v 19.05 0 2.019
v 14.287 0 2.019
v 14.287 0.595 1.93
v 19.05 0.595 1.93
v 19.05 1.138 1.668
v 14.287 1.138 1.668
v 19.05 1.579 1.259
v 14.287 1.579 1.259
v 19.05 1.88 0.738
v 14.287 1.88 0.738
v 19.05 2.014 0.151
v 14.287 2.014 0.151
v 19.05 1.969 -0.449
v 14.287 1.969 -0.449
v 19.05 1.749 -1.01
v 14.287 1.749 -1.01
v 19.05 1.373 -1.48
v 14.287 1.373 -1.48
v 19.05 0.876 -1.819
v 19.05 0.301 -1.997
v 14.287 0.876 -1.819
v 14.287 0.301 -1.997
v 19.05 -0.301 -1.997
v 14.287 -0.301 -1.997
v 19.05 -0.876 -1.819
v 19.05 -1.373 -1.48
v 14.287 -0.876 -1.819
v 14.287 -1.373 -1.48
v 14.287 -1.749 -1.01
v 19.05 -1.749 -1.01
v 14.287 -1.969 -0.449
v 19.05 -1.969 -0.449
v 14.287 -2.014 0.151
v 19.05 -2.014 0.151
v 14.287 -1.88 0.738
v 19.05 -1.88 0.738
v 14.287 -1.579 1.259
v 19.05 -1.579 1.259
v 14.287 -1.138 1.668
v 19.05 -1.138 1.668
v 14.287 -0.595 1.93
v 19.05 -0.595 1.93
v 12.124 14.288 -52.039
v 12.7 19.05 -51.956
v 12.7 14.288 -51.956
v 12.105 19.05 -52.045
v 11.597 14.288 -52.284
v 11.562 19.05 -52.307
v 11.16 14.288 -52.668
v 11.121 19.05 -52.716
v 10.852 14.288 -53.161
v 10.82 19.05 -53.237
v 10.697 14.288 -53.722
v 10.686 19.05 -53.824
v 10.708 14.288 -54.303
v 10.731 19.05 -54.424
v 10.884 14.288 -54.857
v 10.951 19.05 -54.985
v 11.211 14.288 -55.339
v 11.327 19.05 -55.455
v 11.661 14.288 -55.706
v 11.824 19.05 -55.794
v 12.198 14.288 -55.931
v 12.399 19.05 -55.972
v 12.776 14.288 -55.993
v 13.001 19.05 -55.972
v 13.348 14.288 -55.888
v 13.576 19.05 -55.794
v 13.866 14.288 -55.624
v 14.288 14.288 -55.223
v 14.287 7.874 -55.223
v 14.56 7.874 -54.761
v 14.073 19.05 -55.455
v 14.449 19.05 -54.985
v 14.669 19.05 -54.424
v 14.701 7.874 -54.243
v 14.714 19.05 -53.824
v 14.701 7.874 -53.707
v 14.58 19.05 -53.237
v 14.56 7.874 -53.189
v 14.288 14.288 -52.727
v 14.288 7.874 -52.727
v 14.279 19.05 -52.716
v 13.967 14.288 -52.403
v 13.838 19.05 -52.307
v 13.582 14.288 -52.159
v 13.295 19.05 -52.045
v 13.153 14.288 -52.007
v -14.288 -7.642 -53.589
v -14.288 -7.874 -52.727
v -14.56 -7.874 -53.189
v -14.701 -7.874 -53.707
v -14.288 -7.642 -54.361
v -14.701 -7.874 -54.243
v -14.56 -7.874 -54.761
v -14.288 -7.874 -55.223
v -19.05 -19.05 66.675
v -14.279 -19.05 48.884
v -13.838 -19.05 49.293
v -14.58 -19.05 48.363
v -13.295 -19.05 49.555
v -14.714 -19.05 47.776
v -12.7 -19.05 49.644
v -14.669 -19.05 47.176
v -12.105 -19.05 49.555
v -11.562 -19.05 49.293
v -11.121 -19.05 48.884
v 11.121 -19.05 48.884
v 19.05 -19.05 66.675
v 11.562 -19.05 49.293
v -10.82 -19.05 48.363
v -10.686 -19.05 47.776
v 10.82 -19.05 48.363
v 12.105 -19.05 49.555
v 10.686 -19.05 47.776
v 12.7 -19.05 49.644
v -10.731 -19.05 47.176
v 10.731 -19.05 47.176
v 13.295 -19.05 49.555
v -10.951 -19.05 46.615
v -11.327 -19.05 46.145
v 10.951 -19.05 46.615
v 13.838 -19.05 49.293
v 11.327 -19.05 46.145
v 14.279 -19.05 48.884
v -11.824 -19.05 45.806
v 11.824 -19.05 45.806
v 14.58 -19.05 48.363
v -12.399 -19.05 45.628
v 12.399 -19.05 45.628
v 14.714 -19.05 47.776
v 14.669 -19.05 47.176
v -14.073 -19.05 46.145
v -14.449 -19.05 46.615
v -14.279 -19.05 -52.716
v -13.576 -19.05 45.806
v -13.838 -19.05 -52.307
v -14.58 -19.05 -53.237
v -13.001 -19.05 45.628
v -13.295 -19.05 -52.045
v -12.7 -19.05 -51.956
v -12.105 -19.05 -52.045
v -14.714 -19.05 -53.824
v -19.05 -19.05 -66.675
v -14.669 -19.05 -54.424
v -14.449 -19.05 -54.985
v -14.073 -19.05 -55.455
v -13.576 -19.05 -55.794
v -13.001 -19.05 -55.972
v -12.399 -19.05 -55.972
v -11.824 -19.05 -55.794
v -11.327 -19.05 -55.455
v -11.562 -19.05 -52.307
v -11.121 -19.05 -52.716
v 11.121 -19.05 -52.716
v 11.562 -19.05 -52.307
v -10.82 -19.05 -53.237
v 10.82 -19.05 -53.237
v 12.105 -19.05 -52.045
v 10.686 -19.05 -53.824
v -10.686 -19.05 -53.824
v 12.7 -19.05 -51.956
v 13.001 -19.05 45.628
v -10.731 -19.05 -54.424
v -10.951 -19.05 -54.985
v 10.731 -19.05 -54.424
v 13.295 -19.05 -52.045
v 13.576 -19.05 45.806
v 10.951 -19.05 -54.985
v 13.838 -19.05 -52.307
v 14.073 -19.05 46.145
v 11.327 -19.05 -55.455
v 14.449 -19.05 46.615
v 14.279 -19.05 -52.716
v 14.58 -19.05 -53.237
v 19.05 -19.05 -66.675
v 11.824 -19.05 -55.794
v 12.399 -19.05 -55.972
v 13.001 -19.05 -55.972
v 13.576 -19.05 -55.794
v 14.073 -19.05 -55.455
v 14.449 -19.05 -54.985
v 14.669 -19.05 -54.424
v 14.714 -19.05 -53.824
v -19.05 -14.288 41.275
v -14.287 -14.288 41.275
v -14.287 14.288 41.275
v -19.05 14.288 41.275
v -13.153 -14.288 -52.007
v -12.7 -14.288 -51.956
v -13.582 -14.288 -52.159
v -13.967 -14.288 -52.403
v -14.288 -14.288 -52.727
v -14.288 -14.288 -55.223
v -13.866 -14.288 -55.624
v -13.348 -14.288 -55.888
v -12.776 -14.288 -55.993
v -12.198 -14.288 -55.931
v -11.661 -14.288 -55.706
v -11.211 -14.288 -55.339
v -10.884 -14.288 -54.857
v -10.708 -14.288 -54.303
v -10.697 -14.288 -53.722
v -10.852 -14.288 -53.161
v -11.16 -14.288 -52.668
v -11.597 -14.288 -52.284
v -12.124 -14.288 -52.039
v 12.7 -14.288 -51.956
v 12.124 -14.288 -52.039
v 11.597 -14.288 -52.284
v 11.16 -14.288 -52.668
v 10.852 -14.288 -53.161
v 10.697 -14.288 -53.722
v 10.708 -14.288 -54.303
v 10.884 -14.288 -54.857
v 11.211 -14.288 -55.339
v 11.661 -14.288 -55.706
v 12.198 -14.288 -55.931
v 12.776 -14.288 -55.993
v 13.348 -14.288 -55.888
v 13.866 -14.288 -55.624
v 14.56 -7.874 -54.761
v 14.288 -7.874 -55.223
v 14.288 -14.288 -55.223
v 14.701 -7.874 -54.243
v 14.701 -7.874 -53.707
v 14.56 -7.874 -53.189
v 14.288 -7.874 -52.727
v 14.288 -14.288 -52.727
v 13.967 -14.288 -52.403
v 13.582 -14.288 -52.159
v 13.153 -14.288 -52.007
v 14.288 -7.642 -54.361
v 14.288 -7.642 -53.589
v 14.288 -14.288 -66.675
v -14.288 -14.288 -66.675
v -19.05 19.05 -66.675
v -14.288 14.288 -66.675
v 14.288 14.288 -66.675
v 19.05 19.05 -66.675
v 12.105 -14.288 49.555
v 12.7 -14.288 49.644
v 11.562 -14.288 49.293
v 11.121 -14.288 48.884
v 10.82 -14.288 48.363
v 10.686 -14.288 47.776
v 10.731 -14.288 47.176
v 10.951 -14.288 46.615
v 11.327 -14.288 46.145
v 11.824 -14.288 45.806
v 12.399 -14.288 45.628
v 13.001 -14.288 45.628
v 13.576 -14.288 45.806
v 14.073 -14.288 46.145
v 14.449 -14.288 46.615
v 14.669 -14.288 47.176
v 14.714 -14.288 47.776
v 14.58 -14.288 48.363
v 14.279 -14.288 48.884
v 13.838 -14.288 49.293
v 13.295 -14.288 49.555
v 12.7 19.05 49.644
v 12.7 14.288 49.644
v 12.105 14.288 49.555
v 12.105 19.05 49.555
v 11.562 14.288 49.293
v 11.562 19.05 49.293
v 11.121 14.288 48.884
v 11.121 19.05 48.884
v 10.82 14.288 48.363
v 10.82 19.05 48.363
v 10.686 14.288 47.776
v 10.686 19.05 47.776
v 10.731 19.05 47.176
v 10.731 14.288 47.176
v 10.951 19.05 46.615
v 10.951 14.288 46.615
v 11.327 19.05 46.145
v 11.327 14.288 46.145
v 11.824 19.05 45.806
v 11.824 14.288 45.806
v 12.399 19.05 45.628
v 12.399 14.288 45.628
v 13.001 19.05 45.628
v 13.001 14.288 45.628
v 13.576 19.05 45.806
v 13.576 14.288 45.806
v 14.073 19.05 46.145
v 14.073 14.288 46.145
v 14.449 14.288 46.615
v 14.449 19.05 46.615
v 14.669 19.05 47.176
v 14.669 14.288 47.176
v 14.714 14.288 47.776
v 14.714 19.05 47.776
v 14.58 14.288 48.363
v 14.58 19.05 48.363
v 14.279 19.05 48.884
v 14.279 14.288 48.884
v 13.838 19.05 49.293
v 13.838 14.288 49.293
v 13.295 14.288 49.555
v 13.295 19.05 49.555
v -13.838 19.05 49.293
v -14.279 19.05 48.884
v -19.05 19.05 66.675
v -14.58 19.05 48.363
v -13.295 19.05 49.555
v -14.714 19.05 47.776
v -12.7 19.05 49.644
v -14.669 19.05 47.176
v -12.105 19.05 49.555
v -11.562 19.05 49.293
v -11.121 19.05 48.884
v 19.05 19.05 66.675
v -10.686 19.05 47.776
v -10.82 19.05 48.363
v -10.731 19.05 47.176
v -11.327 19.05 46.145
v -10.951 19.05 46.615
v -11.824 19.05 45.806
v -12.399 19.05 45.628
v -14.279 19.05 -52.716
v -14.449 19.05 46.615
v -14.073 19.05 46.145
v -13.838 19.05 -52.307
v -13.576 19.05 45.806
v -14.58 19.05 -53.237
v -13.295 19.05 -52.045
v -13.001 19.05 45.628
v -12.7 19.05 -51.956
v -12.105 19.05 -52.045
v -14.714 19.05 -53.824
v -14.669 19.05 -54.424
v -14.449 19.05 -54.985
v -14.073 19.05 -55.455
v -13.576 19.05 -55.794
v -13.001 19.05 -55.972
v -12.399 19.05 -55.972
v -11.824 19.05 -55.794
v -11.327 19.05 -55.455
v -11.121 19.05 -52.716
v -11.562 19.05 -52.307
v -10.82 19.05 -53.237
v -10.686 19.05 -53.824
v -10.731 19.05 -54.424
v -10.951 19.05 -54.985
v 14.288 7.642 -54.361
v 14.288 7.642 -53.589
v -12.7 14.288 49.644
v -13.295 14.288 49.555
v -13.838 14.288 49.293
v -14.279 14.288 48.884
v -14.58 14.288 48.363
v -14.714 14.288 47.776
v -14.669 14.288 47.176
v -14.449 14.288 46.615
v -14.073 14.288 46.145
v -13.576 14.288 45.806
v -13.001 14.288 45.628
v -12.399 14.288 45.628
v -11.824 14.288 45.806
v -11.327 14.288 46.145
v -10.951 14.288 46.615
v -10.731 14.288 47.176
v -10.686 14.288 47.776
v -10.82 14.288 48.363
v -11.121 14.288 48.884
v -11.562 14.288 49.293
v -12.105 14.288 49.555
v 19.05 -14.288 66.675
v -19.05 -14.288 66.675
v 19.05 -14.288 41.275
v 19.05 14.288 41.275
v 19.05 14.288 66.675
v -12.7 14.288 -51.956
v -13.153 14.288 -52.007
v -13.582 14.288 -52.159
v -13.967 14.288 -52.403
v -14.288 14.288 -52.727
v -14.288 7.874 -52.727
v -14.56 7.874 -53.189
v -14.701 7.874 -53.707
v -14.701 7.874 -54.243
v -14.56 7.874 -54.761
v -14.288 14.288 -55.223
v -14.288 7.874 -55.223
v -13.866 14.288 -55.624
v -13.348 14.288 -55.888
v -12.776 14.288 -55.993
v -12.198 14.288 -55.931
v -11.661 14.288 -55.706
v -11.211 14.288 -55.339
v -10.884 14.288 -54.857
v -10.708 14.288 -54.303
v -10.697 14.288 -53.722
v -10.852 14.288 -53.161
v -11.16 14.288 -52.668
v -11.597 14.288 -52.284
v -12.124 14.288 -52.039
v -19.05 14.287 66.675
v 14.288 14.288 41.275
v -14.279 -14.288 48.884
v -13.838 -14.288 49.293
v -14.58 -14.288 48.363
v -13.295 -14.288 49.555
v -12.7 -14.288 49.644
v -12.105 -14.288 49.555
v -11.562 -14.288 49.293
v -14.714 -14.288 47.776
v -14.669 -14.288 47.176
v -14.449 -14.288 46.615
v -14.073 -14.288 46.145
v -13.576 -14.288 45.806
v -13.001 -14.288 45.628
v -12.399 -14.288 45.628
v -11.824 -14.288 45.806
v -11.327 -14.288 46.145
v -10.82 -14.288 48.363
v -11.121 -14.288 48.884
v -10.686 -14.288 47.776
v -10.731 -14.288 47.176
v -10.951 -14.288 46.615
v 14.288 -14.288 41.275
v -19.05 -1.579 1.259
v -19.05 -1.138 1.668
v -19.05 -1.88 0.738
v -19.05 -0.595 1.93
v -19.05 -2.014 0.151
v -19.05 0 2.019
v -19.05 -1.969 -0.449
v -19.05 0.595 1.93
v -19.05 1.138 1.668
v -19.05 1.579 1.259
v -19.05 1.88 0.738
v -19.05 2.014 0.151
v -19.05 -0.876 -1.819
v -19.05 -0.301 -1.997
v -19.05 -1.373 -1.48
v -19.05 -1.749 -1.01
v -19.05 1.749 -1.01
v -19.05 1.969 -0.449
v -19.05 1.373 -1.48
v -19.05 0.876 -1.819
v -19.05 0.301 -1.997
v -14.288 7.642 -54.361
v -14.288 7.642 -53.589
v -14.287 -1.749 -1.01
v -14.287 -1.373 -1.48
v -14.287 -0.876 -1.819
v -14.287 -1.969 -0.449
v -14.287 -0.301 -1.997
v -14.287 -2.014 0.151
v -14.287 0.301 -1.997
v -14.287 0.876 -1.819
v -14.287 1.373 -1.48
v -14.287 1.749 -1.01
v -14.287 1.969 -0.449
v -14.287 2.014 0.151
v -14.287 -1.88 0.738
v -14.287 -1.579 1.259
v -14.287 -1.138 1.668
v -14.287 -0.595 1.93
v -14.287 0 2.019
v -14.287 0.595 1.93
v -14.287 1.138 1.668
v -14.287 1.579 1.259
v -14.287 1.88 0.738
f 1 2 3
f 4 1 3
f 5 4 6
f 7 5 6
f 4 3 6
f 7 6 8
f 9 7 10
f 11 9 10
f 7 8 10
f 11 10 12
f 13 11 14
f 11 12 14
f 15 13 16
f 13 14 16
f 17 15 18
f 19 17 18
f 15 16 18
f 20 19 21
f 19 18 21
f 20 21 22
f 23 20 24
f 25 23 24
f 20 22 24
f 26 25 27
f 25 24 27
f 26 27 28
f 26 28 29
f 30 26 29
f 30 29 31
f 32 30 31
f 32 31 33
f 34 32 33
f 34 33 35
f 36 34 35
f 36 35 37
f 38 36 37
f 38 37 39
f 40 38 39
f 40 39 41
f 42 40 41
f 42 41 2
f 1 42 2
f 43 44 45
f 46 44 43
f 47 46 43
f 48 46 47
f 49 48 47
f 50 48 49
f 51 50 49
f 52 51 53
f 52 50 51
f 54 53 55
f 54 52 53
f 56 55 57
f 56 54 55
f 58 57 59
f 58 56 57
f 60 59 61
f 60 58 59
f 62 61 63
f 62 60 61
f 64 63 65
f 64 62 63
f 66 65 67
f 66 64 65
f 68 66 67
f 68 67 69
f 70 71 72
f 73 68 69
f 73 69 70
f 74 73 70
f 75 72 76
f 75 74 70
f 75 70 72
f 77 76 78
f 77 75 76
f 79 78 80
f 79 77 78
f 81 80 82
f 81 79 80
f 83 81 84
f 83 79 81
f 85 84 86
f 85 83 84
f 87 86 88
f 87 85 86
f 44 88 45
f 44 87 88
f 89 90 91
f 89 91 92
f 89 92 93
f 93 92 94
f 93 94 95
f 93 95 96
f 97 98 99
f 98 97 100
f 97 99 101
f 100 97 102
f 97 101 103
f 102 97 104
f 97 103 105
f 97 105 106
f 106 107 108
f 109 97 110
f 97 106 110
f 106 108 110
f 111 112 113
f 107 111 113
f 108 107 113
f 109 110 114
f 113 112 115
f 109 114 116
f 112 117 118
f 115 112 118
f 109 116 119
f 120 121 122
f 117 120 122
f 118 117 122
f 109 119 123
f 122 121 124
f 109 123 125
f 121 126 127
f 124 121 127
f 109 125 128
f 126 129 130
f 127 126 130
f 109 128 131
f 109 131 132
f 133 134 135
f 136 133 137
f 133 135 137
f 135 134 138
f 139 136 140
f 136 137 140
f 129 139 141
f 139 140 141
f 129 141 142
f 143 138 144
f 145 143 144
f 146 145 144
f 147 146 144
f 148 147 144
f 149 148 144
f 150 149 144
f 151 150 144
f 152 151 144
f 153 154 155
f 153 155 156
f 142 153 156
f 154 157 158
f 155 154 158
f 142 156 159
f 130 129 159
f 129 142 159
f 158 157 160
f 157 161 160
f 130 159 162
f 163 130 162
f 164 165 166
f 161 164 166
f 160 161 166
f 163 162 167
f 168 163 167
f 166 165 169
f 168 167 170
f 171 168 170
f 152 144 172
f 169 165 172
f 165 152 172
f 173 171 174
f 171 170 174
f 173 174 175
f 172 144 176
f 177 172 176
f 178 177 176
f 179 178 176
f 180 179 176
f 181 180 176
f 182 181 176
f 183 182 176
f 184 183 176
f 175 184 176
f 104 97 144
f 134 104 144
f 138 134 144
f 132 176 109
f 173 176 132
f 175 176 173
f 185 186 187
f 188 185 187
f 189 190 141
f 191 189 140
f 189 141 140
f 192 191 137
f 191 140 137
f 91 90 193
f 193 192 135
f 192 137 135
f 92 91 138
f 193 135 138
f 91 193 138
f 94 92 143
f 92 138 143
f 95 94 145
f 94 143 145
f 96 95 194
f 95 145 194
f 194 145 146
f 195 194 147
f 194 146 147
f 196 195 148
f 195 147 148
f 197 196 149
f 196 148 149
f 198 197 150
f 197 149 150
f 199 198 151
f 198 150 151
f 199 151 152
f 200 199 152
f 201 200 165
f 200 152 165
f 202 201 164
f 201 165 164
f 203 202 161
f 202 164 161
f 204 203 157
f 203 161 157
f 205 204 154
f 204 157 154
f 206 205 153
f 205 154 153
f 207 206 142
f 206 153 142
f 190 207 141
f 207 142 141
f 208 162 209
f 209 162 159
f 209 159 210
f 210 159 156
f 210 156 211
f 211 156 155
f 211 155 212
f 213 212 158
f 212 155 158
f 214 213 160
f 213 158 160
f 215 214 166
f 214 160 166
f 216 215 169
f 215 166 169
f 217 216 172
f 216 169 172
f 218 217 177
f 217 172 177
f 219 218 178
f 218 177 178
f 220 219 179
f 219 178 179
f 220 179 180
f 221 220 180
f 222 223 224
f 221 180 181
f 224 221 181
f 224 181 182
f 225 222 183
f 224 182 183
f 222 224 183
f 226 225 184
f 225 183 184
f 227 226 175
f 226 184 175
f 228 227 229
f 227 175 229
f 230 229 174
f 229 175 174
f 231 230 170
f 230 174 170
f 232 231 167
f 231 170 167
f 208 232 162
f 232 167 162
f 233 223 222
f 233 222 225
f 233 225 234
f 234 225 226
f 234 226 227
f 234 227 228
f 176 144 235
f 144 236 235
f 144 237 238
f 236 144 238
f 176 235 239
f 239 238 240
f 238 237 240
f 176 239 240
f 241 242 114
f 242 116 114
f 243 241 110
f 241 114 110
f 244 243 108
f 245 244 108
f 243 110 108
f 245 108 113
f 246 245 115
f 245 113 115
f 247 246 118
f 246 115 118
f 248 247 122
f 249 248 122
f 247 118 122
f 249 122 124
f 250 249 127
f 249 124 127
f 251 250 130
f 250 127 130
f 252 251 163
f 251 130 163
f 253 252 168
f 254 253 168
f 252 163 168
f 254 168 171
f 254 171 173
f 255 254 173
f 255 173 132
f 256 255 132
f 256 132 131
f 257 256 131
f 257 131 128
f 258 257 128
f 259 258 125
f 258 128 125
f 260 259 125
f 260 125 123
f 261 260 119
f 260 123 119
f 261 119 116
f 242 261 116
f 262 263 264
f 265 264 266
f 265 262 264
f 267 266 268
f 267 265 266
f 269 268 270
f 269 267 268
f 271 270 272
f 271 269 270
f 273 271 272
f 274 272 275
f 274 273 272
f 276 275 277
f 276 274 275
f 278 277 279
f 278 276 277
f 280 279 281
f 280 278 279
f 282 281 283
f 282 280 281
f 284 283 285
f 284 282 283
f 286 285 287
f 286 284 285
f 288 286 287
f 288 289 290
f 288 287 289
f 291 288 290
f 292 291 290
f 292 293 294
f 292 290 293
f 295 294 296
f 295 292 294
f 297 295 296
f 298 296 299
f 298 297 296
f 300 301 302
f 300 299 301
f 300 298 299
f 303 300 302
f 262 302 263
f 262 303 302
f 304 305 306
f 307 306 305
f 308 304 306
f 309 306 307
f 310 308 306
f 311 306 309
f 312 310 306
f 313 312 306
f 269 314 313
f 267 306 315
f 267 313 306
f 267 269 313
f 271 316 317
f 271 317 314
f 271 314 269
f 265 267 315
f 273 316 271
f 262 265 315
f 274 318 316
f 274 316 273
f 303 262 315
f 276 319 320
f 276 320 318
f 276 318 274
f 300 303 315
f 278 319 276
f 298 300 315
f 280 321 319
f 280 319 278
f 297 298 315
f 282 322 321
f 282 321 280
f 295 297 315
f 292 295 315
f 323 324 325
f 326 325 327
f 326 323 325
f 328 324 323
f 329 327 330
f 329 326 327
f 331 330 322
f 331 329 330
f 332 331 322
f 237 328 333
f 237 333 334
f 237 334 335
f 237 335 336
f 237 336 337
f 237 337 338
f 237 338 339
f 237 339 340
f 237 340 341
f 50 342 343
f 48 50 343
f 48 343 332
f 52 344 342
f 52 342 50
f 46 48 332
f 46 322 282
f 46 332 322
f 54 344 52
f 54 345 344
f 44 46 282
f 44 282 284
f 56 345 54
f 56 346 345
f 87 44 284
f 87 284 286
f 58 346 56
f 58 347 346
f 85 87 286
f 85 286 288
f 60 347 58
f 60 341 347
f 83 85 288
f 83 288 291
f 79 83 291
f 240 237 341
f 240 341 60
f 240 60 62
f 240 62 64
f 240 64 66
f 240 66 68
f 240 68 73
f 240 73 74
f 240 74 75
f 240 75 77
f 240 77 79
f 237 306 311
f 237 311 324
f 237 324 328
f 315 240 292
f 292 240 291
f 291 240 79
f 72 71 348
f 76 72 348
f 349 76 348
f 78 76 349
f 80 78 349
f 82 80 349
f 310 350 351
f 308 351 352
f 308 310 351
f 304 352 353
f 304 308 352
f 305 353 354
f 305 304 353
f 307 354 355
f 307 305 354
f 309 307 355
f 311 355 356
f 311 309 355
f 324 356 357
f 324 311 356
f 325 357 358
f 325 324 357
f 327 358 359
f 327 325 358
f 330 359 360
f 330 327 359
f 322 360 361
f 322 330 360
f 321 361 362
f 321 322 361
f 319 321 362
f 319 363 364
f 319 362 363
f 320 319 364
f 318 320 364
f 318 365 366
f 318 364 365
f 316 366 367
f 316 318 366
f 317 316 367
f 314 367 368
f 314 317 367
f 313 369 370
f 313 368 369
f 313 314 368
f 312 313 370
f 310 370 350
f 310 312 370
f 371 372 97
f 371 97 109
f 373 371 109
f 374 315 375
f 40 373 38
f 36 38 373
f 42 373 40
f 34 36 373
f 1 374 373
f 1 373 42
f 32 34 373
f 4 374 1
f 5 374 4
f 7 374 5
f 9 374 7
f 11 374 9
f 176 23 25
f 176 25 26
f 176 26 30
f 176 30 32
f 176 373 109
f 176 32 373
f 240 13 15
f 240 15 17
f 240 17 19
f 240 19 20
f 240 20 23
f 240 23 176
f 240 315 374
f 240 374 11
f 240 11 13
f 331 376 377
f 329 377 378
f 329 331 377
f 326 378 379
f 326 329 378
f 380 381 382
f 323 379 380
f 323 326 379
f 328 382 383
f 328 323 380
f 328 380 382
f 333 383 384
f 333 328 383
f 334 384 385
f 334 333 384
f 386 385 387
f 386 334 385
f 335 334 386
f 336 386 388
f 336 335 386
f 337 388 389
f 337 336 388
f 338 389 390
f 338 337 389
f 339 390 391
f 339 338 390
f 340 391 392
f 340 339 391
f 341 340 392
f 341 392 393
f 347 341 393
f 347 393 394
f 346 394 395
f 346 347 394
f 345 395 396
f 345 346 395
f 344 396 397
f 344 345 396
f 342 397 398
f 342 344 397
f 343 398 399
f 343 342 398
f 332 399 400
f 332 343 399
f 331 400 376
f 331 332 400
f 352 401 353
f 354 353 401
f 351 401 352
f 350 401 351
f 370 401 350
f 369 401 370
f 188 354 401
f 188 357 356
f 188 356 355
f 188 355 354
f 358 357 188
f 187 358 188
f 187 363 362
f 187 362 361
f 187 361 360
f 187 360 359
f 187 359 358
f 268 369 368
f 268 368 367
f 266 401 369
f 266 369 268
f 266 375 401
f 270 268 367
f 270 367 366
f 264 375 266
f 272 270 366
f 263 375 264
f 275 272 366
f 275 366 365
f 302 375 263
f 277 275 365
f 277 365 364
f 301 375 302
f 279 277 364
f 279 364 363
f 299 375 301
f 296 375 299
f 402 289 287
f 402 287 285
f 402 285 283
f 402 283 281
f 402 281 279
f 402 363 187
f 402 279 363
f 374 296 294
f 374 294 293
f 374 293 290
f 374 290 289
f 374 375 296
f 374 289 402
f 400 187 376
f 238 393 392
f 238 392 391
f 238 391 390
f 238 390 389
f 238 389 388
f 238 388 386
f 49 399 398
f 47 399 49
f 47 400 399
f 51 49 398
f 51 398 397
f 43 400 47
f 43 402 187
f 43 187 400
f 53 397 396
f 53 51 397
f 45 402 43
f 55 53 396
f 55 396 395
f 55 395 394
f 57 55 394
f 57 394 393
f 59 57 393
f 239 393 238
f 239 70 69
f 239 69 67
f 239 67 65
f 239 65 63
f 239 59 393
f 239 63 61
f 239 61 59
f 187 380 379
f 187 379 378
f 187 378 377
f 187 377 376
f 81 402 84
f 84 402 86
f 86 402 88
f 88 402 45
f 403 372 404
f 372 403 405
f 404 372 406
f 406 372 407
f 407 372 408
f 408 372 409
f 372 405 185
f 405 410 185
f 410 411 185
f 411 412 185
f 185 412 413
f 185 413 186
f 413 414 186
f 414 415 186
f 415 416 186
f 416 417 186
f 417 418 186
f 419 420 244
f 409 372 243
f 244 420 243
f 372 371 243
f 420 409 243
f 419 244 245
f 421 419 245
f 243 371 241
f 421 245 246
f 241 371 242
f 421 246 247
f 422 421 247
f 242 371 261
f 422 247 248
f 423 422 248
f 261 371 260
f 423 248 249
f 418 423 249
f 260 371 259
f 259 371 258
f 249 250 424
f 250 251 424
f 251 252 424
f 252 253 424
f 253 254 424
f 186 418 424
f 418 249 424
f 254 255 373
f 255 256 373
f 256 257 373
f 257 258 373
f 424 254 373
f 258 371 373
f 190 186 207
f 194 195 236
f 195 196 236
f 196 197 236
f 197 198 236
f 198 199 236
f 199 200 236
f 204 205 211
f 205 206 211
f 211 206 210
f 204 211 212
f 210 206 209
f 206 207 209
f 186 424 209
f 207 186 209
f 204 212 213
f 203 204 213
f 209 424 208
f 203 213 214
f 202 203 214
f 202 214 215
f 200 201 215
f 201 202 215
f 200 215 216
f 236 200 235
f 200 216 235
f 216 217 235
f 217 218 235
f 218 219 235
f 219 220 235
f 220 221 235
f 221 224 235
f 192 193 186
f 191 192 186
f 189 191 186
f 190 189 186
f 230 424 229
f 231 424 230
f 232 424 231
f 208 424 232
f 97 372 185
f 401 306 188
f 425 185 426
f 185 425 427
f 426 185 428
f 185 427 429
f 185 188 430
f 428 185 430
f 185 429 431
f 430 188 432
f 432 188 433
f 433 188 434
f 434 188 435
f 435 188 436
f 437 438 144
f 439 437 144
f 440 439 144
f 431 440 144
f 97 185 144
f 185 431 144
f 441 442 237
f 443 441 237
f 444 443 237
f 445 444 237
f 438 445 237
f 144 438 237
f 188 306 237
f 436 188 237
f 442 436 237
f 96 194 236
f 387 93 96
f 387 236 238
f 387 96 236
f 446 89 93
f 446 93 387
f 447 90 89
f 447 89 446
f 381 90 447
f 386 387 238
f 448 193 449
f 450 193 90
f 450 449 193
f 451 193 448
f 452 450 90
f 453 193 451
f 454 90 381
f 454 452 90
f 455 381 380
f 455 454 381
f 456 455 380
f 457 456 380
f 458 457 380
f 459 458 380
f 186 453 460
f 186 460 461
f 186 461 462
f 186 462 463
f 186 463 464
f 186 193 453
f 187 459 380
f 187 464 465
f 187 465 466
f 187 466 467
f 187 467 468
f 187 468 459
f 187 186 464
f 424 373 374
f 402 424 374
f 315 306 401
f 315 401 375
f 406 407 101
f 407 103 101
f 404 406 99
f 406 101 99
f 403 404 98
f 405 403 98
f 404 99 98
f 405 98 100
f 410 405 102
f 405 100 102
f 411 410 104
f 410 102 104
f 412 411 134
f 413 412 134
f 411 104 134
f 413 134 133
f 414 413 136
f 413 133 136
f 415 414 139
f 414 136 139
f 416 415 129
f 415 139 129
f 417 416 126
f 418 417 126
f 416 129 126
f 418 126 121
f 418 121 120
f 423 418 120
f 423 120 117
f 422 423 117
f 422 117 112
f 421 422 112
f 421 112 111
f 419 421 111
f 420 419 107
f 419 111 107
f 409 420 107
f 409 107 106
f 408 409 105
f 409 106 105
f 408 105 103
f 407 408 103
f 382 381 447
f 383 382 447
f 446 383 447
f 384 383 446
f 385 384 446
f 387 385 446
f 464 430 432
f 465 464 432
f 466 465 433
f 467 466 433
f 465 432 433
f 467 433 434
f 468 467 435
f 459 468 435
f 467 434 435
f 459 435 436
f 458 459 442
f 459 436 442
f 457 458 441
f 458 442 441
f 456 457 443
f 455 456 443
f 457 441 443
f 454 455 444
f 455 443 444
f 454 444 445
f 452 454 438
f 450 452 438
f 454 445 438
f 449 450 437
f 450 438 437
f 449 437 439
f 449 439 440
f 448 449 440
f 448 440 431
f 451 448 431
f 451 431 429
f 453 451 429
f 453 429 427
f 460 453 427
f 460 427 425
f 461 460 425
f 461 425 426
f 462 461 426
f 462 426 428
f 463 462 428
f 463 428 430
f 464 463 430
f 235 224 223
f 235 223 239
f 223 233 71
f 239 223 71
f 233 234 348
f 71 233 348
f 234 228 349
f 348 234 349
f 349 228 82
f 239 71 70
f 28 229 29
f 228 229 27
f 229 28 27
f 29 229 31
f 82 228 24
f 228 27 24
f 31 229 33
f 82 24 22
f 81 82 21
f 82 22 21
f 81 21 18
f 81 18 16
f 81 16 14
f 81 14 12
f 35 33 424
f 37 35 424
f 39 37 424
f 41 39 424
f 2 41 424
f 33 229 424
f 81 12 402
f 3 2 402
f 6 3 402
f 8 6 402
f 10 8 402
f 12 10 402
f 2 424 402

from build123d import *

# Parameters (mm, degrees)
SKETCH1_W                       = 38.1
SKETCH1_H                       = 133.35
BOSS_EXTRUDE1_DEPTH             = 19.05
SKETCH2_W                       = 28.575
SKETCH2_H                       = 28.575
CUT_EXTRUDE1_DEPTH              = 134.35
SKETCH3_W                       = 25.4
SKETCH3_H                       = 28.575
CUT_EXTRUDE2_DEPTH              = 39.1
F_10_32_TAPPED_HOLE1_AT_2_COUNT = 2
F_10_32_TAPPED_HOLE1_AT_2_PITCH = 25.4
F_10_32_TAPPED_HOLE1_AT_3_COUNT = 2
F_10_32_TAPPED_HOLE1_AT_3_PITCH = 101.6
F_10_32_TAPPED_HOLE1_AT_4_COUNT = 2
F_10_32_TAPPED_HOLE1_AT_4_PITCH = 104.726882891
F_10_32_TAPPED_HOLE2_D          = 4.0386


with BuildPart() as part:
    # Sketch1 → Boss-Extrude1 (new body, symmetric)
    with BuildSketch(Plane(origin=(0, 0, 0), x_dir=(1, 0, 0), z_dir=(0, 1, 0))):
        Rectangle(SKETCH1_W, SKETCH1_H)
    extrude(amount=BOSS_EXTRUDE1_DEPTH, both=True)

    # Sketch2 → Cut-Extrude1 (cut, through all)
    with BuildSketch(Plane.XY.offset(66.675)):
        Rectangle(SKETCH2_W, SKETCH2_H)
    extrude(amount=-CUT_EXTRUDE1_DEPTH, mode=Mode.SUBTRACT)

    # Sketch3 → Cut-Extrude2 (cut, through all)
    with BuildSketch(Plane(origin=(19.05, 0, 0), x_dir=(0, 0, -1), z_dir=(1, 0, 0))):
        with Locations((-53.975, 0)):
            Rectangle(SKETCH3_W, SKETCH3_H)
    extrude(amount=-CUT_EXTRUDE2_DEPTH, mode=Mode.SUBTRACT)

    # Sketch4 → #10-32 Tapped Hole1 (revolve, cut)
    with BuildSketch(Plane(origin=(-12.7, 19.05, 47.625), x_dir=(0, 0, 1), z_dir=(1, 0, 0))):
        Polygon((0, 0), (0, 12.389317848), (2.0193, 11.176), (2.0193, 0), align=None)
    f_10_32_tapped_hole1 = revolve(axis=Axis((-12.7, 25.4, 47.625), (0, -1, 0)), mode=Mode.SUBTRACT)

    # #10-32 Tapped Hole1 at 2: #10-32 Tapped Hole1 ×2
    with Locations(*[(i * F_10_32_TAPPED_HOLE1_AT_2_PITCH, 0, 0) for i in range(1, F_10_32_TAPPED_HOLE1_AT_2_COUNT)]):
        add(f_10_32_tapped_hole1, mode=Mode.SUBTRACT)

    # #10-32 Tapped Hole1 at 3: #10-32 Tapped Hole1 ×2
    with Locations(*[(0, 0, -i * F_10_32_TAPPED_HOLE1_AT_3_PITCH) for i in range(1, F_10_32_TAPPED_HOLE1_AT_3_COUNT)]):
        add(f_10_32_tapped_hole1, mode=Mode.SUBTRACT)

    # #10-32 Tapped Hole1 at 4: #10-32 Tapped Hole1 ×2
    with Locations(*[Vector(0.242535625, 0, -0.9701425) * (i * F_10_32_TAPPED_HOLE1_AT_4_PITCH) for i in range(1, F_10_32_TAPPED_HOLE1_AT_4_COUNT)]):
        add(f_10_32_tapped_hole1, mode=Mode.SUBTRACT)

    # #10-32 Tapped Hole2 (through all)
    with Locations(Plane(origin=(19.05, 0, 0), x_dir=(0, 0, -1), z_dir=(1, 0, 0))):
        with Locations((0, 0)):
            Hole(F_10_32_TAPPED_HOLE2_D / 2)

    # Mirror1: #10-32 Tapped Hole1 across plane
    add(f_10_32_tapped_hole1.mirror(Plane.ZX), mode=Mode.SUBTRACT)

    # Mirror1 copy 1 sketch → Mirror1 copy 1 (revolve, cut)
    with BuildSketch(Plane(origin=(12.7, -19.05, 47.625), x_dir=(0, 0, 1), z_dir=(1, 0, 0))):
        Polygon((0, 0), (0, -12.389317848), (2.0193, -11.176), (2.0193, 0), align=None)
    revolve(axis=Axis((12.7, -25.4, 47.625), (0, -1, 0)), mode=Mode.SUBTRACT)

    # Mirror1 copy 2 sketch → Mirror1 copy 2 (revolve, cut)
    with BuildSketch(Plane(origin=(-12.7, -19.05, -53.975), x_dir=(0, 0, 1), z_dir=(1, 0, 0))):
        Polygon((0, 0), (0, -12.389317848), (2.0193, -11.176), (2.0193, 0), align=None)
    revolve(axis=Axis((-12.7, -25.4, -53.975), (0, -1, 0)), mode=Mode.SUBTRACT)

    # Mirror1 copy 3 sketch → Mirror1 copy 3 (revolve, cut)
    with BuildSketch(Plane(origin=(12.7, -19.05, -53.975), x_dir=(0, 0, 1), z_dir=(1, 0, 0))):
        Polygon((0, 0), (0, -12.389317848), (2.0193, -11.176), (2.0193, 0), align=None)
    revolve(axis=Axis((12.7, -25.4, -53.975), (0, -1, 0)), mode=Mode.SUBTRACT)


solid = part.part
